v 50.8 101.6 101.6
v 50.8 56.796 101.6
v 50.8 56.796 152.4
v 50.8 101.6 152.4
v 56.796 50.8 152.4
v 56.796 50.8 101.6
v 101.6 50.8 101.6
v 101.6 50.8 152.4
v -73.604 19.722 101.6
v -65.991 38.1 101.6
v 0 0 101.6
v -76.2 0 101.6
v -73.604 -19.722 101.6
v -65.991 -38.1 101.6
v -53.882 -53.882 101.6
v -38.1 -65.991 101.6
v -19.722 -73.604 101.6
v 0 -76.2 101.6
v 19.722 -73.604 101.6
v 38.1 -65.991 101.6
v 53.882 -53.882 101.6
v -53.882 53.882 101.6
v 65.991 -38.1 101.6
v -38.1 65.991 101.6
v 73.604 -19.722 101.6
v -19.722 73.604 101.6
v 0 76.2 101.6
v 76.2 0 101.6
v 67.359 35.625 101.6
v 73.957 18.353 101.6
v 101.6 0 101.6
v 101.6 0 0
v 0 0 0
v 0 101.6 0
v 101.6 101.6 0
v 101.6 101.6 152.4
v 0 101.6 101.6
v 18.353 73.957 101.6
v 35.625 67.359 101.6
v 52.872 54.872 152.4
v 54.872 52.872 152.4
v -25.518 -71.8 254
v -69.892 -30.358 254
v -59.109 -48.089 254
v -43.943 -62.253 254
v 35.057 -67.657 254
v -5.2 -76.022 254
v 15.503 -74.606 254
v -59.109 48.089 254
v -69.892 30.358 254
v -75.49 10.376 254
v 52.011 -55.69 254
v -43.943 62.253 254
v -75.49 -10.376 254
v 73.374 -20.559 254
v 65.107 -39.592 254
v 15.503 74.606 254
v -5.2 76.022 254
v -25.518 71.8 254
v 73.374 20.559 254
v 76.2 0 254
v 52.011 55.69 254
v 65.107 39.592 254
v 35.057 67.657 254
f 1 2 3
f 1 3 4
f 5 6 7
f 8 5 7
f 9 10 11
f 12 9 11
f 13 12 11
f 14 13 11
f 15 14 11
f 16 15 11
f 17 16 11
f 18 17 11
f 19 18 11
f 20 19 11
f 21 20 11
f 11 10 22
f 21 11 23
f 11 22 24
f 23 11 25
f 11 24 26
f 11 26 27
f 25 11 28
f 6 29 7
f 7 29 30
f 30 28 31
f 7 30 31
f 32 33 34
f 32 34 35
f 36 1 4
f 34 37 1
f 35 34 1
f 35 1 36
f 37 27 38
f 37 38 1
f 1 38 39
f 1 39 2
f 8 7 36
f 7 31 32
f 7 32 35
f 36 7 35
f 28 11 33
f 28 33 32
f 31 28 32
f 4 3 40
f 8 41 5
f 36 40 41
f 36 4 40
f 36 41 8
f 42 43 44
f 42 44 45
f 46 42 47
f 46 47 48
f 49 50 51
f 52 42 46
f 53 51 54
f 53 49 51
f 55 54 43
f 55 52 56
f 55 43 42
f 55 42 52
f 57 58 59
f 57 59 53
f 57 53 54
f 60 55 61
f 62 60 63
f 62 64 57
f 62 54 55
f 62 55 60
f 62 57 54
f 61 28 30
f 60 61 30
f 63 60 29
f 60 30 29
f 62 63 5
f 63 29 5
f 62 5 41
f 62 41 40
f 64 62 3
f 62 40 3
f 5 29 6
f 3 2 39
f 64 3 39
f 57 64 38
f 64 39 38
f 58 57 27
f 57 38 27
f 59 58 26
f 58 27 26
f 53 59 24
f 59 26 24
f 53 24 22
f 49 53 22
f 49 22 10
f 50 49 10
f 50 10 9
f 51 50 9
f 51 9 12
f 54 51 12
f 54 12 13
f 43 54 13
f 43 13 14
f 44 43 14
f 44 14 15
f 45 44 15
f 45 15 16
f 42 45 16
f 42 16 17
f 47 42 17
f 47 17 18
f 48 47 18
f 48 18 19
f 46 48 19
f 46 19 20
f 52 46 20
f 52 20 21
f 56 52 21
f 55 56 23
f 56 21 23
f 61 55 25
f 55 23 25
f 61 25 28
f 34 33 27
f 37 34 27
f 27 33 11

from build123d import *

# Parameters (mm, degrees)
F0_W     = 101.6
F0_H     = 101.6
F1_DEPTH = 101.6
F2_R     = 76.2
F3_DEPTH = 152.4
F4_W     = 50.8
F4_H     = 50.8
F5_DEPTH = 50.8


with BuildPart() as f1:
    # F0 (on Front) → F1 (new body)
    with BuildSketch(Plane.XZ):
        with Locations((50.8, 50.8)):
            Rectangle(F0_W, F0_H)
    extrude(amount=-F1_DEPTH)

    # F2 (on face) → F3 (join)
    with BuildSketch(Plane.XY.offset(101.6)):
        Circle(F2_R)
    extrude(amount=F3_DEPTH)

    # F4 (on face) → F5 (join)
    with BuildSketch(Plane.XY.offset(101.6)):
        with Locations((76.2, 76.2)):
            Rectangle(F4_W, F4_H)
    extrude(amount=F5_DEPTH)


solid = f1.part
